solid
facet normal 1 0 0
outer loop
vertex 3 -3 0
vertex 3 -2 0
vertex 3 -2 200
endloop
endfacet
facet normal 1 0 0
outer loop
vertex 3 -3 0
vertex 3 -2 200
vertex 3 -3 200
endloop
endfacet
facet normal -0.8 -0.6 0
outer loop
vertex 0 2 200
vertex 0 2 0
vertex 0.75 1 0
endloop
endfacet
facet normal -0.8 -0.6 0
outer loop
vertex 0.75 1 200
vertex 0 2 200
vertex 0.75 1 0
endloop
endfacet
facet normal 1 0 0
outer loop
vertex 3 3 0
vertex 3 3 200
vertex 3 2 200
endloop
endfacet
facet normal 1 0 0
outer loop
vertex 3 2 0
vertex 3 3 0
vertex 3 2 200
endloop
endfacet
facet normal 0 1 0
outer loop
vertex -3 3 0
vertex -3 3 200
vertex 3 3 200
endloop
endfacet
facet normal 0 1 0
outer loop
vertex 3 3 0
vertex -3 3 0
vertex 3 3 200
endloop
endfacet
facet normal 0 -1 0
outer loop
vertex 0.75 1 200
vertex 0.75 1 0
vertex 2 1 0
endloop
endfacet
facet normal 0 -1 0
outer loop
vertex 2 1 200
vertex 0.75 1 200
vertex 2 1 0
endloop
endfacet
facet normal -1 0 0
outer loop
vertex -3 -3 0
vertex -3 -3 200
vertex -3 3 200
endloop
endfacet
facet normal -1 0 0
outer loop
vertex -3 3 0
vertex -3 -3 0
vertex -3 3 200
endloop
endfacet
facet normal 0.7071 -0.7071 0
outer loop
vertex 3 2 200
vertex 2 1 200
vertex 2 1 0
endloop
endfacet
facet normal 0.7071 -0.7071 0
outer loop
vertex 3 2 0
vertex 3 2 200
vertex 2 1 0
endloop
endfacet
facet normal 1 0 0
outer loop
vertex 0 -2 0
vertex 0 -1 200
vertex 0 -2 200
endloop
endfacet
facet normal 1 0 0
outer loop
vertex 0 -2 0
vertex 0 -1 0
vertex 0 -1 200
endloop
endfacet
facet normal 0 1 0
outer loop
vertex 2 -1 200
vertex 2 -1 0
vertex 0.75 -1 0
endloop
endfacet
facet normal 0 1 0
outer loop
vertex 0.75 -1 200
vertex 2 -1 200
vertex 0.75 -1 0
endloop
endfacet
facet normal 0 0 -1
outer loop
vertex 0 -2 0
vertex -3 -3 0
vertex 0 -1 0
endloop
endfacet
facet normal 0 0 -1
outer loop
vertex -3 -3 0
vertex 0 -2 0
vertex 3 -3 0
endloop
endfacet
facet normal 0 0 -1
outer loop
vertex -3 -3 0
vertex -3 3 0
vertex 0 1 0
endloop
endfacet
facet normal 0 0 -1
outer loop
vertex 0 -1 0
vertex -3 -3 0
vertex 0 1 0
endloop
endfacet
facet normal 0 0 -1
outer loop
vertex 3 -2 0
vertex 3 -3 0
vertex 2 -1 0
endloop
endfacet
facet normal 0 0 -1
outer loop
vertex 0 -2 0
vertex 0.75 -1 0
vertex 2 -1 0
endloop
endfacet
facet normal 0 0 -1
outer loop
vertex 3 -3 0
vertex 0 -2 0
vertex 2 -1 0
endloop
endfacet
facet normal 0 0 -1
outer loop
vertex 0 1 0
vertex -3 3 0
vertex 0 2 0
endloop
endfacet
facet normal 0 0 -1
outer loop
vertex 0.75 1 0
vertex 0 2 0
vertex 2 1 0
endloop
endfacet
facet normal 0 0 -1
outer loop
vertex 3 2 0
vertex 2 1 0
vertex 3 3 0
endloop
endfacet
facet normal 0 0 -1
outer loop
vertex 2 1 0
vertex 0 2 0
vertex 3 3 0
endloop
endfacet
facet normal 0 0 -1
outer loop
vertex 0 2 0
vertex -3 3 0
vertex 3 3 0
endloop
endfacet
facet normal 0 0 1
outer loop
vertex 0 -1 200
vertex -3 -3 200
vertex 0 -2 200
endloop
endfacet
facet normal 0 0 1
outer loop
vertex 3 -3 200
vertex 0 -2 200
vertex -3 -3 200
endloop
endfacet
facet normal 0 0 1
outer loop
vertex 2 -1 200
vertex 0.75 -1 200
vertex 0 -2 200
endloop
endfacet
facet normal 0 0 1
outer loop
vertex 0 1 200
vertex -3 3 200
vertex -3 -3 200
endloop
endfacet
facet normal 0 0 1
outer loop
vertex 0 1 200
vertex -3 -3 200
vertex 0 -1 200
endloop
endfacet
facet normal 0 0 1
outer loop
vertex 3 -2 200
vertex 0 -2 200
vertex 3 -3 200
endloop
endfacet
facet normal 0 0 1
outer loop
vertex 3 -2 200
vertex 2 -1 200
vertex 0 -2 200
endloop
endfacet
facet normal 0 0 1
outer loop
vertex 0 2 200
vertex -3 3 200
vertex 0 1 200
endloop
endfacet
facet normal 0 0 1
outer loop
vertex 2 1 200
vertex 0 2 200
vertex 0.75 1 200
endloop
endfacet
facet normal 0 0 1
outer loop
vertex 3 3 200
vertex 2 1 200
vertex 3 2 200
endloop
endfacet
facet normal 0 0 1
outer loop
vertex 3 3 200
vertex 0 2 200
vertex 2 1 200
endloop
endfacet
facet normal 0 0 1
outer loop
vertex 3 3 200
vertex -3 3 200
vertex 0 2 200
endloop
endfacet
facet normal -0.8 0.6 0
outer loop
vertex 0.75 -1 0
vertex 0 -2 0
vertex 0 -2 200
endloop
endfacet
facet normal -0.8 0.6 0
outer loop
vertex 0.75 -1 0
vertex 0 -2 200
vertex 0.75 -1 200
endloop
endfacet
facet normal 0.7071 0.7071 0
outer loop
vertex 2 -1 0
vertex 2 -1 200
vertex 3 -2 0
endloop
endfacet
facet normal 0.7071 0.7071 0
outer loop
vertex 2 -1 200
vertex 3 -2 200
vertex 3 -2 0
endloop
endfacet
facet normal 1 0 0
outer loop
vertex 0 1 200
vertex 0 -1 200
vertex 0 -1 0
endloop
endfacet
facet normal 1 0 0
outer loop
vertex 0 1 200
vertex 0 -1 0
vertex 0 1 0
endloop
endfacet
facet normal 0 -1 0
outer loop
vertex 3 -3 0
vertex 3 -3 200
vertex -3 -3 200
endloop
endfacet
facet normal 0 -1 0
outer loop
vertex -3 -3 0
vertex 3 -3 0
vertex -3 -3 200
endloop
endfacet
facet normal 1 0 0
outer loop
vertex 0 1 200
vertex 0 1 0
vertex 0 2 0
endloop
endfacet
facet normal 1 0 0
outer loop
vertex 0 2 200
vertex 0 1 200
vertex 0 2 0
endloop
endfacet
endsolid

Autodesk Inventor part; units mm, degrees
ref_plane "YZ Plane" through (0, 0, 0) normal (1, 0, 0) x (0, 1, 0)
ref_plane "XZ Plane" through (0, 0, 0) normal (0, 1, 0) x (-1, 0, 0)
ref_plane "XY Plane" through (0, 0, 0) normal (0, 0, 1) x (1, 0, 0)
sketch "Sketch1" plane through (0, 0, 0) normal (0, 0, 1) x (1, 0, 0)
  line L0 (-3, 3) -> (3, 3)
  line L1 (3, 3) -> (3, -3)
  line L2 (3, -3) -> (-3, -3)
  line L3 (-3, -3) -> (-3, 3)
  line L4 (-3, 3) -> (3, -3) construction
  line L5 (3, 3) -> (-3, -3) construction
  line L6 (0, 1) -> (3, 1)
  line L7 (3, 1) -> (3, -1)
  line L8 (3, -1) -> (0, -1)
  line L9 (0, -1) -> (0, 1)
  line L10 (0, 1) -> (3, -1) construction
  line L11 (3, 1) -> (0, -1) construction
  line L12 (0, 1) -> (0, 2)
  line L13 (0, 2) -> (1.5, 0)
  line L14 (0, -1) -> (0, -2)
  line L15 (0, -2) -> (1.5, 0)
  point P0 (0, 0)
  point P1 (0.75, -1)
  point P2 (0.75, 1)
  dimension "d0" = 6
  dimension "d1" = 2
  dimension "d2" = 3
  dimension "d3" = 1
extrude "Extrusion1" add sketch "Sketch1" along normal blind 200 contours L0 L1 L6 L13 L12 L9 L14 L15 L8 L2 L3
chamfer "Chamfer1" distance 1 angle 45 2 edges at (3, 1, 100) (3, -1, 100)
properties part number "LinearRail"
